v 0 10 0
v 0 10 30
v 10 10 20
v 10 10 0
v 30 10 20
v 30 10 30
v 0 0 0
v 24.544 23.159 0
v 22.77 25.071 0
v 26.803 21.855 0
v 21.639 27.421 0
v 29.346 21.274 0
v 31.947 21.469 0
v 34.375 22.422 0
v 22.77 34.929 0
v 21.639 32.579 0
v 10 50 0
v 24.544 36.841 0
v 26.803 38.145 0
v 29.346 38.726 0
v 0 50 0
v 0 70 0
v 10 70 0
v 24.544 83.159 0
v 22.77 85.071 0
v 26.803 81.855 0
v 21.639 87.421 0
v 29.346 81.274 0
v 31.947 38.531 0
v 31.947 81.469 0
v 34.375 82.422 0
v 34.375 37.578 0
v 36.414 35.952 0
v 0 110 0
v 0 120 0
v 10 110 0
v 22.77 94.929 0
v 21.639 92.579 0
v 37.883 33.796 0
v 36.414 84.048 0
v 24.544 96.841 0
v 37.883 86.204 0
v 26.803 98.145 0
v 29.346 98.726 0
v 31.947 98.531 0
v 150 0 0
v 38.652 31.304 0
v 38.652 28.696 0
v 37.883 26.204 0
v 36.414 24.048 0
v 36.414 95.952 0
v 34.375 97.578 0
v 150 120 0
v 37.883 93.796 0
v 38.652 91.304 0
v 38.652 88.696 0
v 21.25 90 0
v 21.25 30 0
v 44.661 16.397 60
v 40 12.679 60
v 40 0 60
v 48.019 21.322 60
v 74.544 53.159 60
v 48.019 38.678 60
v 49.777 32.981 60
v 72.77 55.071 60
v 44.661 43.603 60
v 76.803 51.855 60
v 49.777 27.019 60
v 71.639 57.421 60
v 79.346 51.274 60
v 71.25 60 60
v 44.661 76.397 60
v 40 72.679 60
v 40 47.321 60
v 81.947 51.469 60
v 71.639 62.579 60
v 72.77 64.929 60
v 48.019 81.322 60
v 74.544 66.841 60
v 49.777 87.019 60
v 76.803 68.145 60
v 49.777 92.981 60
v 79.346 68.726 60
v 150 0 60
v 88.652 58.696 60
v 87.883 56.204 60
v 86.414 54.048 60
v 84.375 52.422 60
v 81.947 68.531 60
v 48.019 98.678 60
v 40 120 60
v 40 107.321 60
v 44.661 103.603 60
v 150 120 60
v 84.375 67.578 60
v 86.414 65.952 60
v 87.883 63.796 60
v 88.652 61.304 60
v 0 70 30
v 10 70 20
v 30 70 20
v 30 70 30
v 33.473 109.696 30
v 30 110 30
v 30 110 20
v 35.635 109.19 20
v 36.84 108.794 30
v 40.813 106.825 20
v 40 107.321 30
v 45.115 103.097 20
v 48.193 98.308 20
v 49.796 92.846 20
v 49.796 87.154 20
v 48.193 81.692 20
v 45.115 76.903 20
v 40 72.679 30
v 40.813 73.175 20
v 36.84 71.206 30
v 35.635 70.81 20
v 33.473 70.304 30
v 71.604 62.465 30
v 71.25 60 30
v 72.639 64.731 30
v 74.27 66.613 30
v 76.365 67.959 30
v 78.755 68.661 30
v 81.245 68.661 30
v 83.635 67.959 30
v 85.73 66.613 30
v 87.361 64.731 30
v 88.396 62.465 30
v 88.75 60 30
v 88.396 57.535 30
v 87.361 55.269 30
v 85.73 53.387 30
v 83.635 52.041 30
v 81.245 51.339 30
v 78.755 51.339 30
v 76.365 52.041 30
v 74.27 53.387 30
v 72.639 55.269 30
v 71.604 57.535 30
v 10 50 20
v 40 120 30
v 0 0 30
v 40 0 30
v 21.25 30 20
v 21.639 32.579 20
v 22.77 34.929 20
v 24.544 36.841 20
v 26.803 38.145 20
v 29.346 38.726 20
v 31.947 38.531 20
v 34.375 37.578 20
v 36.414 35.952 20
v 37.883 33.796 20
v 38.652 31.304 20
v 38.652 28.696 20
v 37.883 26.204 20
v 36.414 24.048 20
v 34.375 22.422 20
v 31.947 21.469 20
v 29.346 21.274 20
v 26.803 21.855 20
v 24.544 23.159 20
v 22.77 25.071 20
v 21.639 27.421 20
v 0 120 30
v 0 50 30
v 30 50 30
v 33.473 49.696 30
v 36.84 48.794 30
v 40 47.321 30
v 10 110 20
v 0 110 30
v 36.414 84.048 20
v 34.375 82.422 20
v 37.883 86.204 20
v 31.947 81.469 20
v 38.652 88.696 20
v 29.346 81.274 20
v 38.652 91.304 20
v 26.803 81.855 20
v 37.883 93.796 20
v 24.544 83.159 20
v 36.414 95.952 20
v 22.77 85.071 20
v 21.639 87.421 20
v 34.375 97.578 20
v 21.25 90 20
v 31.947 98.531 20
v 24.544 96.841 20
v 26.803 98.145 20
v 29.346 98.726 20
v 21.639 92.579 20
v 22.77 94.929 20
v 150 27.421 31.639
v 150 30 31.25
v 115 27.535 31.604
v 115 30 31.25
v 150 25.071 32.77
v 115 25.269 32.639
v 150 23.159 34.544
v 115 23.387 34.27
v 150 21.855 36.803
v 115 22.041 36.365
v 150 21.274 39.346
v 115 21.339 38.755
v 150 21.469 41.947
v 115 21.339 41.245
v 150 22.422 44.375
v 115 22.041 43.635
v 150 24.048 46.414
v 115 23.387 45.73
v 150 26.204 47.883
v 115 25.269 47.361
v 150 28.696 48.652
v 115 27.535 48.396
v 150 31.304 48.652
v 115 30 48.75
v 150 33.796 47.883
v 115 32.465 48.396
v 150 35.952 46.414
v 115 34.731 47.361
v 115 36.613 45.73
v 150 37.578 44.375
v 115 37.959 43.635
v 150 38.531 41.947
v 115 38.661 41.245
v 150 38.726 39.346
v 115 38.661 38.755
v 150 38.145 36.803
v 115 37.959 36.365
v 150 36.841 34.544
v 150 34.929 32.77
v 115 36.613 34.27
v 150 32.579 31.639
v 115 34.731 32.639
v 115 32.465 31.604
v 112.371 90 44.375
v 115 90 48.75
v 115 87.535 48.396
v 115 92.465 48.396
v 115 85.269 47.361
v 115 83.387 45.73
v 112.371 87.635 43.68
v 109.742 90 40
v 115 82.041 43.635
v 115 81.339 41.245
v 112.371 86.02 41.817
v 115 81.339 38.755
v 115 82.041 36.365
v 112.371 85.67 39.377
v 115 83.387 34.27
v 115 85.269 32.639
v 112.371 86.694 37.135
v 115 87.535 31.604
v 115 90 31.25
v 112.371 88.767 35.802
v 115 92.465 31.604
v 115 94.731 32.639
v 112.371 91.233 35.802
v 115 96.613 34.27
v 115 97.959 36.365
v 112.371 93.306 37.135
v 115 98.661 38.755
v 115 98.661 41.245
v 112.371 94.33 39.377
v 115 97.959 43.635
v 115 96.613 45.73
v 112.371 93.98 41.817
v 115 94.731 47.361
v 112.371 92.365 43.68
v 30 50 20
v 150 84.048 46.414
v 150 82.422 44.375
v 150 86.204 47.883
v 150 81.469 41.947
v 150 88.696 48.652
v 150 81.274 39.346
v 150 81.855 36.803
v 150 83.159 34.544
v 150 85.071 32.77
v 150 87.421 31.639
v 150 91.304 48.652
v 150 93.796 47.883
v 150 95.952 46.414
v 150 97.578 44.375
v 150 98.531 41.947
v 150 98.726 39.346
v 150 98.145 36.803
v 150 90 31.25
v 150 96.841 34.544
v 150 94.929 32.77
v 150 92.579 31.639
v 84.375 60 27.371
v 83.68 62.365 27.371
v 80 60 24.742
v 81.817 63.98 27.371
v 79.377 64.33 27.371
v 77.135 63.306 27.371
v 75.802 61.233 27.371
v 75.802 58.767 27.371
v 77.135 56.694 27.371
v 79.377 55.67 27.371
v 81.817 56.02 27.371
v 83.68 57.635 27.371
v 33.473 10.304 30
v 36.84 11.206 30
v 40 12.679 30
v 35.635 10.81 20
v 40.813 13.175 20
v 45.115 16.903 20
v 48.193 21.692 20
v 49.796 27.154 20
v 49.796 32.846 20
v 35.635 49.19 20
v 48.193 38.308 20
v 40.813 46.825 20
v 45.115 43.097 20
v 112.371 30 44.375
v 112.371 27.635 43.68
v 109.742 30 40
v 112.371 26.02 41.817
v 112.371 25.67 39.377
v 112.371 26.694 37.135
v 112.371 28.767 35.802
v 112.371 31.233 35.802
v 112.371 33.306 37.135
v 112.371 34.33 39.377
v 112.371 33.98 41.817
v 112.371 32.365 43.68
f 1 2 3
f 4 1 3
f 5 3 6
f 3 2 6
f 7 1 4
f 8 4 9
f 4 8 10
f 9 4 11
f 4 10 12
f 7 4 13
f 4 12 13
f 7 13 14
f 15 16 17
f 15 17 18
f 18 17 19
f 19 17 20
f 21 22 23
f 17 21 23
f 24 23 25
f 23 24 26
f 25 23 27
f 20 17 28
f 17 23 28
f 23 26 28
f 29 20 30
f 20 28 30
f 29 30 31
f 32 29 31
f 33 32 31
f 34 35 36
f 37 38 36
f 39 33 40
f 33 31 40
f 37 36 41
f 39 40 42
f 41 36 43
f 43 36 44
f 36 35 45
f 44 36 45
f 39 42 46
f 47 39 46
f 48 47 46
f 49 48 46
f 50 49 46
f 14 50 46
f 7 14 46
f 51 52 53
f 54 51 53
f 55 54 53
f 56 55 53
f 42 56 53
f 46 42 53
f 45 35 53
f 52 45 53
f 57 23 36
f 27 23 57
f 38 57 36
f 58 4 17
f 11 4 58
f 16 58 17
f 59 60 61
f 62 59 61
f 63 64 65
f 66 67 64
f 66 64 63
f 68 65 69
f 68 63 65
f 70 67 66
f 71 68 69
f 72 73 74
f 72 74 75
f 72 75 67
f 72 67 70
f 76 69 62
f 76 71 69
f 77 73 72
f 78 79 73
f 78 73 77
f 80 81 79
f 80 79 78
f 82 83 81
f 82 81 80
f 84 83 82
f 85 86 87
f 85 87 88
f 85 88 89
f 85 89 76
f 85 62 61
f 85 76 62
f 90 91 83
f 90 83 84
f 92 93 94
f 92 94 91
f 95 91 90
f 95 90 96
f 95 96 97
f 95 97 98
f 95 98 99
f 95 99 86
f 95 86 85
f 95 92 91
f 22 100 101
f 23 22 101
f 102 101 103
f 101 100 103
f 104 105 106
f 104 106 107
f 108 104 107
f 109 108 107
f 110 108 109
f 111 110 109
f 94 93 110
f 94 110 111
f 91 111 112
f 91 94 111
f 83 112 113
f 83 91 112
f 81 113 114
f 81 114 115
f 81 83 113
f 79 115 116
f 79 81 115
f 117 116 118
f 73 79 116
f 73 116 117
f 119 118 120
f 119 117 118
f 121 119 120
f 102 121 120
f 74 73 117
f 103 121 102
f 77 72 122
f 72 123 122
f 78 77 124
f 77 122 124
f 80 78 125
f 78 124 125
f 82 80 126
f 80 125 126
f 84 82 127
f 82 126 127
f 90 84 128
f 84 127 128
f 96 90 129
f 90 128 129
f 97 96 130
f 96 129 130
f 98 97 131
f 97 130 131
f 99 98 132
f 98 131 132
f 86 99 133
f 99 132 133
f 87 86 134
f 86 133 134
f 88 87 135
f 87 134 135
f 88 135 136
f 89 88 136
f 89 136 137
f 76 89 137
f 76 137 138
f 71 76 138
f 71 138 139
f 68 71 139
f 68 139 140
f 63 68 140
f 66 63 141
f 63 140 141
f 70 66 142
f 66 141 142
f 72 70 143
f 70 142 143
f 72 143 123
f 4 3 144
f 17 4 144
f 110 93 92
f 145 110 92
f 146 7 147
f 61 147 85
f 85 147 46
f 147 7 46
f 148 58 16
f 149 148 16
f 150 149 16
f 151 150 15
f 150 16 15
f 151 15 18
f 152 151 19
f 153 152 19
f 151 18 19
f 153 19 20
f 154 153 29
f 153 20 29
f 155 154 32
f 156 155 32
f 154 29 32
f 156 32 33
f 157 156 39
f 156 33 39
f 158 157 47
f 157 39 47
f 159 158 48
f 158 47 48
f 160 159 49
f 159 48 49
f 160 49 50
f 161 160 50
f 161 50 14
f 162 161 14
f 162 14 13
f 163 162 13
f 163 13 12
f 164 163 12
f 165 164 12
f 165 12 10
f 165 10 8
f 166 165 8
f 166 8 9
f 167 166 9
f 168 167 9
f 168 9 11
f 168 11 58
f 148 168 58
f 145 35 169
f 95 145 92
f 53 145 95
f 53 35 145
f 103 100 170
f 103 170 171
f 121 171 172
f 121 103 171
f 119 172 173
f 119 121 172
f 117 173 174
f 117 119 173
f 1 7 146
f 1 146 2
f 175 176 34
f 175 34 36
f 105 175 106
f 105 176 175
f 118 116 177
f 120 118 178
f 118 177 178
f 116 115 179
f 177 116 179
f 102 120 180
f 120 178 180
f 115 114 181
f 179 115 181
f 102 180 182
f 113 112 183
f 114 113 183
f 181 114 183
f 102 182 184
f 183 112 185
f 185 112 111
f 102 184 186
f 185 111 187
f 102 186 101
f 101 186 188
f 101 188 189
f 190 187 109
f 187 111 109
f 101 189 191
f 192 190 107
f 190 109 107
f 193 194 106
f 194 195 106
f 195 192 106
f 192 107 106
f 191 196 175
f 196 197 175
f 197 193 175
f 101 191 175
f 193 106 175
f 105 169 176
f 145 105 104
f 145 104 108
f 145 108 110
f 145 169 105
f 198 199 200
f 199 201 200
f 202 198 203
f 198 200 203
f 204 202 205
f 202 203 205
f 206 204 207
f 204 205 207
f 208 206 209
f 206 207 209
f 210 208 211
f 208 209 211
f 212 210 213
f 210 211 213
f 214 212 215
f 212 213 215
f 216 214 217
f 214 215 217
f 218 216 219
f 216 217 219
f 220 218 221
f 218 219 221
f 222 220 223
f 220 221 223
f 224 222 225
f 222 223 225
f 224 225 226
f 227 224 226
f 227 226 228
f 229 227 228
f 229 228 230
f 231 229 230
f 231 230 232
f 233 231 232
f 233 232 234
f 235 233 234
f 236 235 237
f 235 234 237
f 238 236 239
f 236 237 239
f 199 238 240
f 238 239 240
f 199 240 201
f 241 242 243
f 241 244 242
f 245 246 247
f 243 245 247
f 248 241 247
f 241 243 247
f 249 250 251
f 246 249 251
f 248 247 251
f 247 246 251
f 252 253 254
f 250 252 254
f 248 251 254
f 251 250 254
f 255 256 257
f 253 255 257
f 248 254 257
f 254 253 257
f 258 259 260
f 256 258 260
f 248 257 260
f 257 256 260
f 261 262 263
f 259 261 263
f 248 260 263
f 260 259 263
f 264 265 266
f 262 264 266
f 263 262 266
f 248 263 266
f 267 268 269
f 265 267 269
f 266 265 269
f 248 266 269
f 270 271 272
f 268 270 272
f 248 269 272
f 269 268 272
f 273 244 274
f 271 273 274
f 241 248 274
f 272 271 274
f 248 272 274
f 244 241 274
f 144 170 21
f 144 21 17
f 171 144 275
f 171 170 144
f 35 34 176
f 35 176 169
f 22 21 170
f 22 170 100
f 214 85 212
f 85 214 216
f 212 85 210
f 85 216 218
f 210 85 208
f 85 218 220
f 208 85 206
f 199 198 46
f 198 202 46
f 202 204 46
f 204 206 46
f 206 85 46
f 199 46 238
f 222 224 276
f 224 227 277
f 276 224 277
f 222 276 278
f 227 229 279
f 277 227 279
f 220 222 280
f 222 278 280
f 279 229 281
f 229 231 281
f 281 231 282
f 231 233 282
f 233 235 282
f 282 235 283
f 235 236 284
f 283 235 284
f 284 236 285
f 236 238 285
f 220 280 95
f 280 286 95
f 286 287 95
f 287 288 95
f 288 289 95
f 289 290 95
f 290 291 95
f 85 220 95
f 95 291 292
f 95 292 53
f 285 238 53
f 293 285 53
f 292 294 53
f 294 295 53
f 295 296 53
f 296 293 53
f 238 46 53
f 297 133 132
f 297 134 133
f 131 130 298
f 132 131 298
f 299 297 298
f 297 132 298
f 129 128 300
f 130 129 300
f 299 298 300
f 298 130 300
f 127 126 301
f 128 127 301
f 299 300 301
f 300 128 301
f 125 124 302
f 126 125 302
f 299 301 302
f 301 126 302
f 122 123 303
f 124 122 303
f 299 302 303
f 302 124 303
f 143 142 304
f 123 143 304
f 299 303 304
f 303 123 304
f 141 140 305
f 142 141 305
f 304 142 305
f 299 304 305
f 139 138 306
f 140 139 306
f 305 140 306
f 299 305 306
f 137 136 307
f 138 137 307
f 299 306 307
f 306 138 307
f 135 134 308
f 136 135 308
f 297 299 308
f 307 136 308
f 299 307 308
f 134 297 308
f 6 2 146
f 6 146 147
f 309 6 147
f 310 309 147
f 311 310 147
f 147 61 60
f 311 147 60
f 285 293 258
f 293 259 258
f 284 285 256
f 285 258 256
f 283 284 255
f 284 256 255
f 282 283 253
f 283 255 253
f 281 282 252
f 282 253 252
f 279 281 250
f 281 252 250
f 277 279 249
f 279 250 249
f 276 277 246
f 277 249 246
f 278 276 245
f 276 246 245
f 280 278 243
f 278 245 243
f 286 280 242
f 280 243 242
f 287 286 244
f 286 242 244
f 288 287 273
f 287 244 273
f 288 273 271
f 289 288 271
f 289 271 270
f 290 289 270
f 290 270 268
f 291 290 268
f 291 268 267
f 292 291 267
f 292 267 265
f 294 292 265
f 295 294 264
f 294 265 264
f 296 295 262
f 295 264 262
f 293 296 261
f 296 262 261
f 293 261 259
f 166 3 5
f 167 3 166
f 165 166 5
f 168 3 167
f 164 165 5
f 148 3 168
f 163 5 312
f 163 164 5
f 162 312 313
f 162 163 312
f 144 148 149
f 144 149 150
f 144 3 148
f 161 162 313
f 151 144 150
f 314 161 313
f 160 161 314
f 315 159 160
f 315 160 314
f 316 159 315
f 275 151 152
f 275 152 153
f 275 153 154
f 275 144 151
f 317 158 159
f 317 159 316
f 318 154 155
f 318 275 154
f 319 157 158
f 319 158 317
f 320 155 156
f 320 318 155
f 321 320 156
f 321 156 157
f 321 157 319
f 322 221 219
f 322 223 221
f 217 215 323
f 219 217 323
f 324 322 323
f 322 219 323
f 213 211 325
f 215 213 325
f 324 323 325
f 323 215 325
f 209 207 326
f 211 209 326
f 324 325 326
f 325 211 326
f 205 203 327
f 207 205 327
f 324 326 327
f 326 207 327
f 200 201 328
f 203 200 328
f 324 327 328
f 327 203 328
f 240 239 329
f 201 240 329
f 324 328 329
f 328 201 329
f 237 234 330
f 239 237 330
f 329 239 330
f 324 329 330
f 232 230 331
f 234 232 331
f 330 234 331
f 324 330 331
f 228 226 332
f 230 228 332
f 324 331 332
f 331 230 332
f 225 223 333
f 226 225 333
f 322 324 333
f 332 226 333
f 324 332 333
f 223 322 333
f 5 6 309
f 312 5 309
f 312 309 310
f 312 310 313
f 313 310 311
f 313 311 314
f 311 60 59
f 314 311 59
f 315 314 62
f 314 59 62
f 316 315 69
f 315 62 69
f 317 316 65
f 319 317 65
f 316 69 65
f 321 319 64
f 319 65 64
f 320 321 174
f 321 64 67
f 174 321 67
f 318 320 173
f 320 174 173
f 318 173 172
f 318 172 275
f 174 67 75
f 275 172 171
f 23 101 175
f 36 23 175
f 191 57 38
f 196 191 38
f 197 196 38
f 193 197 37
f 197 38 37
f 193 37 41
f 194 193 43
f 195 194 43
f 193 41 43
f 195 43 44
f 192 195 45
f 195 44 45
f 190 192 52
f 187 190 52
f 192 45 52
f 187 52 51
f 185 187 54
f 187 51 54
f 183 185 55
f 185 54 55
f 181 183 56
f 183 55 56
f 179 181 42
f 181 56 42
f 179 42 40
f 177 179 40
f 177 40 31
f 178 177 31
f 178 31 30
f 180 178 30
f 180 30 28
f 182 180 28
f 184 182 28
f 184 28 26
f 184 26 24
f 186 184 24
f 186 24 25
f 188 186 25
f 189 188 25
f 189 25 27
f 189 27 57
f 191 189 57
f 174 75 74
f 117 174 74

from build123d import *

# Parameters (mm, degrees)
SKETCH1_W              = 150
SKETCH1_H              = 120
BOSS_EXTRUDE1_DEPTH    = 60
SKETCH2_W              = 10
SKETCH2_H              = 40
CUT_EXTRUDE1_DEPTH     = 60
CUT_EXTRUDE2_DEPTH     = 40
M20_TAPPED_HOLE1_D     = 17.5
M20_TAPPED_HOLE1_DEPTH = 67.5
M20_TAPPED_HOLE1_TIP   = 5.257530416
CUT_EXTRUDE4_DEPTH     = 30
M20_TAPPED_HOLE2_D     = 17.5
M20_TAPPED_HOLE2_DEPTH = 30
M20_TAPPED_HOLE2_TIP   = 5.257530416
M20_TAPPED_HOLE3_D     = 17.5
M20_TAPPED_HOLE3_DEPTH = 35
M20_TAPPED_HOLE3_TIP   = 5.257530416


with BuildPart() as part:
    # Sketch1 → Boss-Extrude1 (new body)
    with BuildSketch(Plane.XY):
        with Locations((75, 60)):
            Rectangle(SKETCH1_W, SKETCH1_H)
    extrude(amount=BOSS_EXTRUDE1_DEPTH)

    # Sketch2 → Cut-Extrude1 (cut)
    with BuildSketch(Plane.XY.offset(60)):
        with Locations((5, 90)):
            Rectangle(SKETCH2_W, SKETCH2_H)
        with Locations((5, 30)):
            Rectangle(SKETCH2_W, SKETCH2_H)
    extrude(amount=-CUT_EXTRUDE1_DEPTH, mode=Mode.SUBTRACT)

    # Sketch3 → Cut-Extrude2 (cut)
    with BuildSketch(Plane.XY.offset(60)):
        with BuildLine():
            Line((10, 110), (30, 110))
            ThreePointArc((30, 110), (50, 90), (30, 70))
            Line((30, 70), (10, 70))
            Line((10, 70), (10, 110))
        make_face()
        with BuildLine():
            Line((10, 50), (10, 10))
            Line((10, 10), (30, 10))
            ThreePointArc((30, 10), (50, 30), (30, 50))
            Line((30, 50), (10, 50))
        make_face()
    extrude(amount=-CUT_EXTRUDE2_DEPTH, mode=Mode.SUBTRACT)

    # M20 Tapped Hole1
    with Locations(Plane(origin=(30, 90, 20), x_dir=(1, 0, 0), z_dir=(0, 0, 1))):
        with Locations((0, 0), (0, -60)):
            Hole(M20_TAPPED_HOLE1_D / 2, depth=M20_TAPPED_HOLE1_DEPTH)
            with Locations((0, 0, -(M20_TAPPED_HOLE1_DEPTH + M20_TAPPED_HOLE1_TIP / 2))):  # 118° drill point
                Cone(0, M20_TAPPED_HOLE1_D / 2, M20_TAPPED_HOLE1_TIP, mode=Mode.SUBTRACT)

    # Sketch6 → Cut-Extrude4 (cut)
    with BuildSketch(Plane.XY.offset(60)):
        with BuildLine():
            ThreePointArc((30, 110), (35.176380902, 109.318516526), (40, 107.320508076))
            Line((40, 107.320508076), (40, 120))
            Line((40, 120), (0, 120))
            Line((0, 120), (0, 110))
            Line((0, 110), (30, 110))
        make_face()
        with BuildLine():
            Line((40, 47.320508076), (40, 72.679491924))
            ThreePointArc((40, 72.679491924), (35.176380902, 70.681483474), (30, 70))
            Line((30, 70), (0, 70))
            Line((0, 70), (0, 50))
            Line((0, 50), (30, 50))
            ThreePointArc((30, 50), (35.176380902, 49.318516526), (40, 47.320508076))
        make_face()
        with BuildLine():
            Line((40, 0), (40, 12.679491924))
            ThreePointArc((40, 12.679491924), (35.176380902, 10.681483474), (30, 10))
            Line((30, 10), (0, 10))
            Line((0, 10), (0, 0))
            Line((0, 0), (40, 0))
        make_face()
    extrude(amount=-CUT_EXTRUDE4_DEPTH, mode=Mode.SUBTRACT)

    # M20 Tapped Hole2
    with Locations(Plane(origin=(80, 60, 60), x_dir=(1, 0, 0), z_dir=(0, 0, 1))):
        with Locations((0, 0)):
            Hole(M20_TAPPED_HOLE2_D / 2, depth=M20_TAPPED_HOLE2_DEPTH)
            with Locations((0, 0, -(M20_TAPPED_HOLE2_DEPTH + M20_TAPPED_HOLE2_TIP / 2))):  # 118° drill point
                Cone(0, M20_TAPPED_HOLE2_D / 2, M20_TAPPED_HOLE2_TIP, mode=Mode.SUBTRACT)

    # M20 Tapped Hole3
    with Locations(Plane(origin=(150, 90, 40), x_dir=(0, 0, 1), z_dir=(1, 0, 0))):
        with Locations((0, 0), (0, 60)):
            Hole(M20_TAPPED_HOLE3_D / 2, depth=M20_TAPPED_HOLE3_DEPTH)
            with Locations((0, 0, -(M20_TAPPED_HOLE3_DEPTH + M20_TAPPED_HOLE3_TIP / 2))):  # 118° drill point
                Cone(0, M20_TAPPED_HOLE3_D / 2, M20_TAPPED_HOLE3_TIP, mode=Mode.SUBTRACT)


solid = part.part
